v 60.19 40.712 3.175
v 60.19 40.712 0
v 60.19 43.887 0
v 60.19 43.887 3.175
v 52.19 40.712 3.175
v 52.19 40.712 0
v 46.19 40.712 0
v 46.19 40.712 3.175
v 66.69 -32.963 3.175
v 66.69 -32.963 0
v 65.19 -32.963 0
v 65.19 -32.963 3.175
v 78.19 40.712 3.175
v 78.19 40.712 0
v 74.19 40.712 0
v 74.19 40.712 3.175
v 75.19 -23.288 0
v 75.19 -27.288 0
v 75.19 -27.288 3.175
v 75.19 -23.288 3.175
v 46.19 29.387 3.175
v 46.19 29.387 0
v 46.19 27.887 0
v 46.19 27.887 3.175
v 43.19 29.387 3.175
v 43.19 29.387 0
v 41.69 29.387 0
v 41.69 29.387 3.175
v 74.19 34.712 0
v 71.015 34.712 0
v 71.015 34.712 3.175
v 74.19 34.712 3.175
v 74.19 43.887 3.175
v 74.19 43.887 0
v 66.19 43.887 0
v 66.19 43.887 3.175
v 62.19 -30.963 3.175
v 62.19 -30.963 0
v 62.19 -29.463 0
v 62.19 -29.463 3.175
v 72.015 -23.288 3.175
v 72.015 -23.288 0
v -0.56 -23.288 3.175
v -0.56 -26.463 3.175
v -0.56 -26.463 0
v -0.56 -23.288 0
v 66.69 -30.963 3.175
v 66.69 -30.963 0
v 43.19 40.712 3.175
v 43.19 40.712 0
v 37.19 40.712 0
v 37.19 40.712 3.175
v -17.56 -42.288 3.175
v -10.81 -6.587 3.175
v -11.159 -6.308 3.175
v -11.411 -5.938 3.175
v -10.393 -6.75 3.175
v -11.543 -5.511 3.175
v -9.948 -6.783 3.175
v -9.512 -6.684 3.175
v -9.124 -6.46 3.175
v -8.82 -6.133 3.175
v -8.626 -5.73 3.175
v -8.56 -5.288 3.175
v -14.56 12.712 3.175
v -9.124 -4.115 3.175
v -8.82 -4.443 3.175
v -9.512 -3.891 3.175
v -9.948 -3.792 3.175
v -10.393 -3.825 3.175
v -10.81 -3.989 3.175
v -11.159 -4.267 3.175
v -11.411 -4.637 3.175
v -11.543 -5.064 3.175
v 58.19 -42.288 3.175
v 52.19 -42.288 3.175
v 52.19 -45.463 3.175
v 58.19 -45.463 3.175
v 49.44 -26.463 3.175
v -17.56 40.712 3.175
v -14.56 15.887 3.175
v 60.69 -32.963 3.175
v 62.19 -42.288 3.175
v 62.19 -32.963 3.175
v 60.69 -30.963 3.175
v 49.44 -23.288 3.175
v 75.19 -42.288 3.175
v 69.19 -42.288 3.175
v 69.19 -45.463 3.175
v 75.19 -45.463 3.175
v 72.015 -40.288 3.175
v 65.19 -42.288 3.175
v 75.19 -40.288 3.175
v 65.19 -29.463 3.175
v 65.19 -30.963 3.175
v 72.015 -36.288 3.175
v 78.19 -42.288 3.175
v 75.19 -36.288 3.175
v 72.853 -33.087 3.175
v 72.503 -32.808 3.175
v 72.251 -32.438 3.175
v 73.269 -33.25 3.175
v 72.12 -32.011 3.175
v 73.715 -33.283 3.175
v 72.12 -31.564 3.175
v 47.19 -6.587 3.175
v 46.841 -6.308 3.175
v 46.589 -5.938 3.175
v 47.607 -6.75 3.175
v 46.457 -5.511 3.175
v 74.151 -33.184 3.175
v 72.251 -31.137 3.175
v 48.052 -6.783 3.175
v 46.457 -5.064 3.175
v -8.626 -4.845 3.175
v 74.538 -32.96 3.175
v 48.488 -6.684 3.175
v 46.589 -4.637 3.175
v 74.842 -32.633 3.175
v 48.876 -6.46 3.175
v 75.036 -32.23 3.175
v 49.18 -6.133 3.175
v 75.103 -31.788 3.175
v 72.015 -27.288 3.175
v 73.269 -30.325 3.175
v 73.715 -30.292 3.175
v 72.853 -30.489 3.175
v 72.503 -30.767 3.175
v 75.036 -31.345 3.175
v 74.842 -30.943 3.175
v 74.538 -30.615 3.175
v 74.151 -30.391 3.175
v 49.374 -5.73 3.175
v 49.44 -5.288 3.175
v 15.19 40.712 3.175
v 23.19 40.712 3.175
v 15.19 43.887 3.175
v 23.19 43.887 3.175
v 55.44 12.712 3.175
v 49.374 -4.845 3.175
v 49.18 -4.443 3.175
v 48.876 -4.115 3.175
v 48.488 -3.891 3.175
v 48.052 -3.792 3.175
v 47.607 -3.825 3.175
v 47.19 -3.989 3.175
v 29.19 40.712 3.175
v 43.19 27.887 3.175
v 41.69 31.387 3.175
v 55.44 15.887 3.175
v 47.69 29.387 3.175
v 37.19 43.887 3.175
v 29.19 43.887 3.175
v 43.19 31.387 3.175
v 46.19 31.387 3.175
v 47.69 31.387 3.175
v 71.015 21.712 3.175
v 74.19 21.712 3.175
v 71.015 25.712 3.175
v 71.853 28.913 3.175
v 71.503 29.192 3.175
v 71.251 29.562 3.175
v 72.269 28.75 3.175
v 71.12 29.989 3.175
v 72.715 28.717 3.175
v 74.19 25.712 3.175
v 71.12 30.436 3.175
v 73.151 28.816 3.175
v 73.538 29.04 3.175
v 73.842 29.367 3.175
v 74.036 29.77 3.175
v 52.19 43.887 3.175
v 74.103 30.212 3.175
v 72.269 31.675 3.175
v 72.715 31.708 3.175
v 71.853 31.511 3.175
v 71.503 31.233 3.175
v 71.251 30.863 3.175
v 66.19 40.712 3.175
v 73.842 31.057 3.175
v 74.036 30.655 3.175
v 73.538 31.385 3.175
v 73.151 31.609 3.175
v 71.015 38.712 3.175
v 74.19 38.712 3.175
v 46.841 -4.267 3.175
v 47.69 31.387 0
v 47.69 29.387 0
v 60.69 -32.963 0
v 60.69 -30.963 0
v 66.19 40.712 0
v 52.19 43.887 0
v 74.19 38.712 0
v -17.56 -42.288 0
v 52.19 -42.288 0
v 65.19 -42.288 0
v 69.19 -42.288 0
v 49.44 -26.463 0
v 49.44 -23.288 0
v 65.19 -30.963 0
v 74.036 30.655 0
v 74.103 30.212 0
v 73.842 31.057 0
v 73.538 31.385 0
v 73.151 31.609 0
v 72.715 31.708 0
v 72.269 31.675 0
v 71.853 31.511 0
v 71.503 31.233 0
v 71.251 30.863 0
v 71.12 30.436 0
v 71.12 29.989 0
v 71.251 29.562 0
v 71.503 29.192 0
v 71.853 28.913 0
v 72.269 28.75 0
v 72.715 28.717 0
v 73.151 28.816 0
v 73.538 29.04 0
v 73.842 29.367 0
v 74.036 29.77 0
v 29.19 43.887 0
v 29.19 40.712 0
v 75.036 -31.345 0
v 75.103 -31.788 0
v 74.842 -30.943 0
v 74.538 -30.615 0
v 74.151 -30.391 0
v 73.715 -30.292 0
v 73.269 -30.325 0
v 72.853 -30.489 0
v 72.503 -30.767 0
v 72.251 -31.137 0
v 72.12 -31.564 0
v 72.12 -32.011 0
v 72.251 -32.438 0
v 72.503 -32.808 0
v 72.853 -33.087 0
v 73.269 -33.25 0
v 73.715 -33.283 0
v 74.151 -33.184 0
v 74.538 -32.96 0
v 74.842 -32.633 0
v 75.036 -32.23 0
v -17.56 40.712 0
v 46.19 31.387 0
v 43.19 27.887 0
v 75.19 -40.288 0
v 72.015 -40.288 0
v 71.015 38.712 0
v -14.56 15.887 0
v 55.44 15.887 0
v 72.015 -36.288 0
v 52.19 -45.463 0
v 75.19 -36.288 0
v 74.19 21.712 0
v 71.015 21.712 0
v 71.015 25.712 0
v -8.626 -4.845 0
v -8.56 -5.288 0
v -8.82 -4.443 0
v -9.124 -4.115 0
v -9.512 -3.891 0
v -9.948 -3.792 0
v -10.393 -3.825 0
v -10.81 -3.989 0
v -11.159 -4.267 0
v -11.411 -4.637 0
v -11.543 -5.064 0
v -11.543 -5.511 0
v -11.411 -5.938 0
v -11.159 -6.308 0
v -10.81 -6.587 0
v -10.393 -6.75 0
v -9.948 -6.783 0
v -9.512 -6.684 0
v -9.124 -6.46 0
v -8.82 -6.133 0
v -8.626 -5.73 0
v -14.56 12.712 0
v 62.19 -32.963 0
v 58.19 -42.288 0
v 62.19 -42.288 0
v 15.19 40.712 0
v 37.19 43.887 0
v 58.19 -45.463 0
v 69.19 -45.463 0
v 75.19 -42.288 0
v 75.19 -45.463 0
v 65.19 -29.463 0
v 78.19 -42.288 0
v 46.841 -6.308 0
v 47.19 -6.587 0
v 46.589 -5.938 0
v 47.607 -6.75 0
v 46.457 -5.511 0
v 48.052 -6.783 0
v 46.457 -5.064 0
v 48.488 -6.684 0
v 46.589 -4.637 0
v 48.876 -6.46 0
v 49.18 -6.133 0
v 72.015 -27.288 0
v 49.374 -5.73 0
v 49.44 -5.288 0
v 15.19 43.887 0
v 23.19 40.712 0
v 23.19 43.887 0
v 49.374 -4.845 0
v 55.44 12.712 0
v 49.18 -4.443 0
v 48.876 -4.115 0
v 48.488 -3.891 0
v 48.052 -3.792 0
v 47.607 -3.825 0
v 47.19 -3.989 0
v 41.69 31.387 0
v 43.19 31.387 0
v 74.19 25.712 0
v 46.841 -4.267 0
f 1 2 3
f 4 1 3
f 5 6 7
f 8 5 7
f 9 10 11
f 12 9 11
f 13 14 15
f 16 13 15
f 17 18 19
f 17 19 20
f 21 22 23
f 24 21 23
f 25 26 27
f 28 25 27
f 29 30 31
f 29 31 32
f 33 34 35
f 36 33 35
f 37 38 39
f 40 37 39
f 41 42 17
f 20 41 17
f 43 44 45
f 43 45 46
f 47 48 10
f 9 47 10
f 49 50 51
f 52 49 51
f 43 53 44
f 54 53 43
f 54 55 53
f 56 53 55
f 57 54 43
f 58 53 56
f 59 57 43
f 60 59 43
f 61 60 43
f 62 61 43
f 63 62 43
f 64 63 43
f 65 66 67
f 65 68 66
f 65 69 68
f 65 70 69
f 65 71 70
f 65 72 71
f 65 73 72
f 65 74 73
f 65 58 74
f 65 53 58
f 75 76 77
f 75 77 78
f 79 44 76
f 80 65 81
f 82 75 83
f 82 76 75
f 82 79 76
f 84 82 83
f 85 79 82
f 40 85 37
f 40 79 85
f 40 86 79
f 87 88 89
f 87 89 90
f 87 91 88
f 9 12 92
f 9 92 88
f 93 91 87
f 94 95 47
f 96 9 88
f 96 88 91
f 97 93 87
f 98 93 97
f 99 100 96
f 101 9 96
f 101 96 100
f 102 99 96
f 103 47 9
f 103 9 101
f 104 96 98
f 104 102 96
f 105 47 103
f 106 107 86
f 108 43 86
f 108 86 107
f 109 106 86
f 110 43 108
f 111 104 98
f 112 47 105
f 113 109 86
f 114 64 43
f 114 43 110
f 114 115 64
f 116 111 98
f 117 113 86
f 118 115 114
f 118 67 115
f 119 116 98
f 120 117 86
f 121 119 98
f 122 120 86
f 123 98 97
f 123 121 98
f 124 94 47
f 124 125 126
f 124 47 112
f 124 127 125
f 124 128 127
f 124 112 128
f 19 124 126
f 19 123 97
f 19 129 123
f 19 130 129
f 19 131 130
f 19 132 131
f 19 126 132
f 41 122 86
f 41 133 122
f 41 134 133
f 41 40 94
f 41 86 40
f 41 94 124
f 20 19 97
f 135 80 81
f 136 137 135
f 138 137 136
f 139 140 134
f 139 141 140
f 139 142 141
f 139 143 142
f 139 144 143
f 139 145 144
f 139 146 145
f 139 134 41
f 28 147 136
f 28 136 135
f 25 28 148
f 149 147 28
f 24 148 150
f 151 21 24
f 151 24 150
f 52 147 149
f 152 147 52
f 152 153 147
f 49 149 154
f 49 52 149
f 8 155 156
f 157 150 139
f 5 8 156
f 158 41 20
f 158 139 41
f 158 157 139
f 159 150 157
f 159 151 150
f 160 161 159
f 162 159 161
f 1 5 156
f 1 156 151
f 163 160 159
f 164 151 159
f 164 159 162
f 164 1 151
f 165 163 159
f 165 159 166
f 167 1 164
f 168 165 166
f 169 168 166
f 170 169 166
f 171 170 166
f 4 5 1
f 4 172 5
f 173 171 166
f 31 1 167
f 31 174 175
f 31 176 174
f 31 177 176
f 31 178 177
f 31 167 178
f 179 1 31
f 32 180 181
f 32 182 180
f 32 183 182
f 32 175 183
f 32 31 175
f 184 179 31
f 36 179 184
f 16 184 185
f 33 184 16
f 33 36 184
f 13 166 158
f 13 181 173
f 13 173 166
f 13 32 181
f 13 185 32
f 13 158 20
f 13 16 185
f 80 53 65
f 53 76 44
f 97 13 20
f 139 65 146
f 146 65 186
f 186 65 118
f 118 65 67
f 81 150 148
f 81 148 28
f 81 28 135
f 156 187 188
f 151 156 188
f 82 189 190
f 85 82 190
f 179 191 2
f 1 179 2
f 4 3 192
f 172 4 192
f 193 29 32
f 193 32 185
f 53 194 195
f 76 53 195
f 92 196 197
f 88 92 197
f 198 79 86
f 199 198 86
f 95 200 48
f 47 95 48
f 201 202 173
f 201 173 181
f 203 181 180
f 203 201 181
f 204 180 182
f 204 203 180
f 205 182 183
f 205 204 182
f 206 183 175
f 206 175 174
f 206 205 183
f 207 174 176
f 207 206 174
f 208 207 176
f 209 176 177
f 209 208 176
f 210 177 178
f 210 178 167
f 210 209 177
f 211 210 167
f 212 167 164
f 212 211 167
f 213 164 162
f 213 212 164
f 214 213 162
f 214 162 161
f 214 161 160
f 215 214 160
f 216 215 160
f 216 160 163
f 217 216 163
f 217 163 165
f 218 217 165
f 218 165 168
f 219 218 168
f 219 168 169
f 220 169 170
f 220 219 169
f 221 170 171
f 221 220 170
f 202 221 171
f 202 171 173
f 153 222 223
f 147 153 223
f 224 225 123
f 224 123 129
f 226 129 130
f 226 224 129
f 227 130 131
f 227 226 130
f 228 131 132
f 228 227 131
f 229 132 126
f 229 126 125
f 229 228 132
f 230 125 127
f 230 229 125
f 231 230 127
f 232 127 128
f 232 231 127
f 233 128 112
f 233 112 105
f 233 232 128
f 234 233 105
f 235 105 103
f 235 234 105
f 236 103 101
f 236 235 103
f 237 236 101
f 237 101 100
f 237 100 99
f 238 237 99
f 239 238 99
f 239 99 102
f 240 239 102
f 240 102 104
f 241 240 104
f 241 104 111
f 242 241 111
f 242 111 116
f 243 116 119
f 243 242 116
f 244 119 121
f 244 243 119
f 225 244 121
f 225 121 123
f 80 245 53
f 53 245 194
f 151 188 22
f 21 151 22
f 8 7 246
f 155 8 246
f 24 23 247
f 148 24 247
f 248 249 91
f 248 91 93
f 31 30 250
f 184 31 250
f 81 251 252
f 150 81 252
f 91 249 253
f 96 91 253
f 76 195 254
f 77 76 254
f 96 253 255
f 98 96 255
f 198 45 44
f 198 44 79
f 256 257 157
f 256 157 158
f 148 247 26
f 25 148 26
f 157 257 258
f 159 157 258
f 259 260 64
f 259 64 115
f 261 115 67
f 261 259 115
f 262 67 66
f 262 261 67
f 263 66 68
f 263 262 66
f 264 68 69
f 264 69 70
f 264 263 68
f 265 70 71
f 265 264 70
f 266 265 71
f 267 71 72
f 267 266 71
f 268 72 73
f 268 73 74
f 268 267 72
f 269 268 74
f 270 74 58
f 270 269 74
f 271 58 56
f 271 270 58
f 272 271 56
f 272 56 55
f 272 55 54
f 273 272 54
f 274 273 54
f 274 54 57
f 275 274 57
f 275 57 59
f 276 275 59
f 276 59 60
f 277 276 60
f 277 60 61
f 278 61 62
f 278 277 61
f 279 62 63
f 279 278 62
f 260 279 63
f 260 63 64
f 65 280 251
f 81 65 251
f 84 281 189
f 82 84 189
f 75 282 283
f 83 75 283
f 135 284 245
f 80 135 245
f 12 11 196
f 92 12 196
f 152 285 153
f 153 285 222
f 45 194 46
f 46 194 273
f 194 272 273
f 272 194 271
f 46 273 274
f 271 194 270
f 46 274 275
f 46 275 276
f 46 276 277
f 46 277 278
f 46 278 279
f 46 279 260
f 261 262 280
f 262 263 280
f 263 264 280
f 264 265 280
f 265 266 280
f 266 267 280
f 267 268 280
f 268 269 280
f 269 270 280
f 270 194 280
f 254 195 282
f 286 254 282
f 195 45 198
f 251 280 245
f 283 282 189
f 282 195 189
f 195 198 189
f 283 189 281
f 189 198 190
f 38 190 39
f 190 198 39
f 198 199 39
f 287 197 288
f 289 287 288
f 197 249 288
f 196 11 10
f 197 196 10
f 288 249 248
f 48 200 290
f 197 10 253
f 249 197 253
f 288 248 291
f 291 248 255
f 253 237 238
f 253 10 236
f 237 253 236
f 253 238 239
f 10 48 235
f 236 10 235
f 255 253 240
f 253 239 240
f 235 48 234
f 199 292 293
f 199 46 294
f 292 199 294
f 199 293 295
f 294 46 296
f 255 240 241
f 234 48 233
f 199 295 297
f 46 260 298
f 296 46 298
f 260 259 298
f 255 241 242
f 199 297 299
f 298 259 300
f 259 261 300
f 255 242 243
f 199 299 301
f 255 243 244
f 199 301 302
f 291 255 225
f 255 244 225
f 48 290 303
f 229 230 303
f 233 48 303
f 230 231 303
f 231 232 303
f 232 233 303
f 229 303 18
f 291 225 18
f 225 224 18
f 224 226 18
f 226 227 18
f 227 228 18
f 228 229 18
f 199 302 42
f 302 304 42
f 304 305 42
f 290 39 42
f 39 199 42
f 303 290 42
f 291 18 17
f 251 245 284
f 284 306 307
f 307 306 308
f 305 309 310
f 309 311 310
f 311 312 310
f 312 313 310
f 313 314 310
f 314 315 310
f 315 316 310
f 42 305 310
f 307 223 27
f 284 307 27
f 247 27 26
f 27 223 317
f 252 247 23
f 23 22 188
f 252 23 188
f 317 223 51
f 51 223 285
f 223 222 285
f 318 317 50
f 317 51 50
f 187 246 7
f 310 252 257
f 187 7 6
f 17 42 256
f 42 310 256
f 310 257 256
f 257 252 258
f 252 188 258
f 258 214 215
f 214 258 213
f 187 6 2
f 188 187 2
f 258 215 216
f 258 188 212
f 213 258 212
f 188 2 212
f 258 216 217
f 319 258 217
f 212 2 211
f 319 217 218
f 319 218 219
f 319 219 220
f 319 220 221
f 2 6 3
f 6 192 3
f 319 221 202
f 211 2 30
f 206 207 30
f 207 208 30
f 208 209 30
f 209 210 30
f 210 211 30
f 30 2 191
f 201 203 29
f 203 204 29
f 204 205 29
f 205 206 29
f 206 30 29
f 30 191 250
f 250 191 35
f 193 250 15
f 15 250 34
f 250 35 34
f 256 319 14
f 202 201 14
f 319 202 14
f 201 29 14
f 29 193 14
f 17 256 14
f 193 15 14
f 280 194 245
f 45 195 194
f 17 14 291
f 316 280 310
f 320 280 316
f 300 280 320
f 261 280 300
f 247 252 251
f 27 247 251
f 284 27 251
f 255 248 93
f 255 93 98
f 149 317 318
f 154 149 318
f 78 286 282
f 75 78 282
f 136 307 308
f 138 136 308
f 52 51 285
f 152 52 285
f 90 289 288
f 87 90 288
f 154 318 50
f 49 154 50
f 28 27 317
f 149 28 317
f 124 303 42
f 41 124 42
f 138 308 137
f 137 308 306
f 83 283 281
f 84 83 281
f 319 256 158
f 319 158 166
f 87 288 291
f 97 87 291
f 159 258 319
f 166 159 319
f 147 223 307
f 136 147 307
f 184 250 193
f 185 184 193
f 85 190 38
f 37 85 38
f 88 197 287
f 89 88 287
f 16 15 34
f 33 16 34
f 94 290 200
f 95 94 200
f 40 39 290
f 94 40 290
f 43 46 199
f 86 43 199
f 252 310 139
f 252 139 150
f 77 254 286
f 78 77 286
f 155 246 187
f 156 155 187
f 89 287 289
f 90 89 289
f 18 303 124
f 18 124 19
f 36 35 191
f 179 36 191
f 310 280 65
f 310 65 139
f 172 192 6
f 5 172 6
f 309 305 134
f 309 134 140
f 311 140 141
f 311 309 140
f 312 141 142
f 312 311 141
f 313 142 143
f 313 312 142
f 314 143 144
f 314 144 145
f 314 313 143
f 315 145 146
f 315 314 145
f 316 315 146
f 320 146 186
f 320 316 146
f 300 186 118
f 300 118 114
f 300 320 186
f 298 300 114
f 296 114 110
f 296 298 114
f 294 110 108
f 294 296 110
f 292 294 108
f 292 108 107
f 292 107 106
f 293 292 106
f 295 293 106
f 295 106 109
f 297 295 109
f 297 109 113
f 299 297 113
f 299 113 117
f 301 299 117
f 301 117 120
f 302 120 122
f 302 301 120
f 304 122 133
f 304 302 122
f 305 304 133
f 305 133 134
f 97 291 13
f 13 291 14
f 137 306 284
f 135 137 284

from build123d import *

# Parameters (mm, degrees)
F0_W     = 50
F0_H     = 3.175
F0_R     = 1.5
F0_W_2   = 3.175
F0_H_2   = 4
F0_W_3   = 70
F1_DEPTH = 3.175


# Not quite as in the source:
# - a length typed as a fraction of an inch, garbled in the dataset ("3 / 203.2 mm" for 3/8 in), is restored
# - a feature names something its author has since deleted; it is built from what else it names


with BuildPart() as f1:
    # F0 (on Top) → F1 (new body)
    with BuildSketch(Plane.XY):
        Polygon((46.1903014183, 27.8874409974), (43.1903014183, 27.8874409974), (43.1903014183, 29.3874409974), (41.6903014183, 29.3874409974), (41.6903014183, 31.3874409974), (43.1903014183, 31.3874409974), (43.1903014183, 40.7124409974), (37.1903014183, 40.7124409974), (37.1903014183, 43.8874409974), (29.1903014183, 43.8874409974), (29.1903014183, 40.7124409974), (23.1903014183, 40.7124409974), (23.1903014183, 43.8874409974), (15.1903014183, 43.8874409974), (15.1903014183, 40.7124409974), (-17.5596985817, 40.7124409974), (-17.5596985817, -42.2875590026), (52.1903014183, -42.2875590026), (52.1903014183, -45.4625590026), (58.1903014183, -45.4625590026), (58.1903014183, -42.2875590026), (62.1903014183, -42.2875590026), (62.1903014183, -32.9625590026), (60.6903014183, -32.9625590026), (60.6903014183, -30.9625590026), (62.1903014183, -30.9625590026), (62.1903014183, -29.4625590026), (65.1903014183, -29.4625590026), (65.1903014183, -30.9625590026), (66.6903014183, -30.9625590026), (66.6903014183, -32.9625590026), (65.1903014183, -32.9625590026), (65.1903014183, -42.2875590026), (69.1903014183, -42.2875590026), (69.1903014183, -45.4625590026), (75.1903014183, -45.4625590026), (75.1903014183, -42.2875590026), (78.1903014183, -42.2875590026), (78.1903014183, 40.7124409974), (74.1903014183, 40.7124409974), (74.1903014183, 43.8874409974), (66.1903014183, 43.8874409974), (66.1903014183, 40.7124409974), (60.1903014183, 40.7124409974), (60.1903014183, 43.8874409974), (52.1903014183, 43.8874409974), (52.1903014183, 40.7124409974), (46.1903014183, 40.7124409974), (46.1903014183, 31.3874409974), (47.6903014183, 31.3874409974), (47.6903014183, 29.3874409974), (46.1903014183, 29.3874409974), align=None)
        with Locations((24.4403014183, -24.8750590026)):
            Rectangle(F0_W, F0_H, mode=Mode.SUBTRACT)
        with Locations((-10.0596985817, -5.2875590026)):
            Circle(F0_R, mode=Mode.SUBTRACT)
        with Locations((73.6028014183, -38.2875590026)):
            Rectangle(F0_W_2, F0_H_2, mode=Mode.SUBTRACT)
        with Locations((73.6028014183, -31.7875590026)):
            Circle(F0_R, mode=Mode.SUBTRACT)
        with Locations((73.6028014183, -25.2875590026)):
            Rectangle(F0_W_2, F0_H_2, mode=Mode.SUBTRACT)
        with Locations((47.9403014183, -5.2875590026)):
            Circle(F0_R, mode=Mode.SUBTRACT)
        with Locations((20.4403014183, 14.2999409974)):
            Rectangle(F0_W_3, F0_H, mode=Mode.SUBTRACT)
        with Locations((72.6028014183, 23.7124409974)):
            Rectangle(F0_W_2, F0_H_2, mode=Mode.SUBTRACT)
        with Locations((72.6028014183, 30.2124409974)):
            Circle(F0_R, mode=Mode.SUBTRACT)
        with Locations((72.6028014183, 36.7124409974)):
            Rectangle(F0_W_2, F0_H_2, mode=Mode.SUBTRACT)
    extrude(amount=F1_DEPTH)


solid = f1.part
